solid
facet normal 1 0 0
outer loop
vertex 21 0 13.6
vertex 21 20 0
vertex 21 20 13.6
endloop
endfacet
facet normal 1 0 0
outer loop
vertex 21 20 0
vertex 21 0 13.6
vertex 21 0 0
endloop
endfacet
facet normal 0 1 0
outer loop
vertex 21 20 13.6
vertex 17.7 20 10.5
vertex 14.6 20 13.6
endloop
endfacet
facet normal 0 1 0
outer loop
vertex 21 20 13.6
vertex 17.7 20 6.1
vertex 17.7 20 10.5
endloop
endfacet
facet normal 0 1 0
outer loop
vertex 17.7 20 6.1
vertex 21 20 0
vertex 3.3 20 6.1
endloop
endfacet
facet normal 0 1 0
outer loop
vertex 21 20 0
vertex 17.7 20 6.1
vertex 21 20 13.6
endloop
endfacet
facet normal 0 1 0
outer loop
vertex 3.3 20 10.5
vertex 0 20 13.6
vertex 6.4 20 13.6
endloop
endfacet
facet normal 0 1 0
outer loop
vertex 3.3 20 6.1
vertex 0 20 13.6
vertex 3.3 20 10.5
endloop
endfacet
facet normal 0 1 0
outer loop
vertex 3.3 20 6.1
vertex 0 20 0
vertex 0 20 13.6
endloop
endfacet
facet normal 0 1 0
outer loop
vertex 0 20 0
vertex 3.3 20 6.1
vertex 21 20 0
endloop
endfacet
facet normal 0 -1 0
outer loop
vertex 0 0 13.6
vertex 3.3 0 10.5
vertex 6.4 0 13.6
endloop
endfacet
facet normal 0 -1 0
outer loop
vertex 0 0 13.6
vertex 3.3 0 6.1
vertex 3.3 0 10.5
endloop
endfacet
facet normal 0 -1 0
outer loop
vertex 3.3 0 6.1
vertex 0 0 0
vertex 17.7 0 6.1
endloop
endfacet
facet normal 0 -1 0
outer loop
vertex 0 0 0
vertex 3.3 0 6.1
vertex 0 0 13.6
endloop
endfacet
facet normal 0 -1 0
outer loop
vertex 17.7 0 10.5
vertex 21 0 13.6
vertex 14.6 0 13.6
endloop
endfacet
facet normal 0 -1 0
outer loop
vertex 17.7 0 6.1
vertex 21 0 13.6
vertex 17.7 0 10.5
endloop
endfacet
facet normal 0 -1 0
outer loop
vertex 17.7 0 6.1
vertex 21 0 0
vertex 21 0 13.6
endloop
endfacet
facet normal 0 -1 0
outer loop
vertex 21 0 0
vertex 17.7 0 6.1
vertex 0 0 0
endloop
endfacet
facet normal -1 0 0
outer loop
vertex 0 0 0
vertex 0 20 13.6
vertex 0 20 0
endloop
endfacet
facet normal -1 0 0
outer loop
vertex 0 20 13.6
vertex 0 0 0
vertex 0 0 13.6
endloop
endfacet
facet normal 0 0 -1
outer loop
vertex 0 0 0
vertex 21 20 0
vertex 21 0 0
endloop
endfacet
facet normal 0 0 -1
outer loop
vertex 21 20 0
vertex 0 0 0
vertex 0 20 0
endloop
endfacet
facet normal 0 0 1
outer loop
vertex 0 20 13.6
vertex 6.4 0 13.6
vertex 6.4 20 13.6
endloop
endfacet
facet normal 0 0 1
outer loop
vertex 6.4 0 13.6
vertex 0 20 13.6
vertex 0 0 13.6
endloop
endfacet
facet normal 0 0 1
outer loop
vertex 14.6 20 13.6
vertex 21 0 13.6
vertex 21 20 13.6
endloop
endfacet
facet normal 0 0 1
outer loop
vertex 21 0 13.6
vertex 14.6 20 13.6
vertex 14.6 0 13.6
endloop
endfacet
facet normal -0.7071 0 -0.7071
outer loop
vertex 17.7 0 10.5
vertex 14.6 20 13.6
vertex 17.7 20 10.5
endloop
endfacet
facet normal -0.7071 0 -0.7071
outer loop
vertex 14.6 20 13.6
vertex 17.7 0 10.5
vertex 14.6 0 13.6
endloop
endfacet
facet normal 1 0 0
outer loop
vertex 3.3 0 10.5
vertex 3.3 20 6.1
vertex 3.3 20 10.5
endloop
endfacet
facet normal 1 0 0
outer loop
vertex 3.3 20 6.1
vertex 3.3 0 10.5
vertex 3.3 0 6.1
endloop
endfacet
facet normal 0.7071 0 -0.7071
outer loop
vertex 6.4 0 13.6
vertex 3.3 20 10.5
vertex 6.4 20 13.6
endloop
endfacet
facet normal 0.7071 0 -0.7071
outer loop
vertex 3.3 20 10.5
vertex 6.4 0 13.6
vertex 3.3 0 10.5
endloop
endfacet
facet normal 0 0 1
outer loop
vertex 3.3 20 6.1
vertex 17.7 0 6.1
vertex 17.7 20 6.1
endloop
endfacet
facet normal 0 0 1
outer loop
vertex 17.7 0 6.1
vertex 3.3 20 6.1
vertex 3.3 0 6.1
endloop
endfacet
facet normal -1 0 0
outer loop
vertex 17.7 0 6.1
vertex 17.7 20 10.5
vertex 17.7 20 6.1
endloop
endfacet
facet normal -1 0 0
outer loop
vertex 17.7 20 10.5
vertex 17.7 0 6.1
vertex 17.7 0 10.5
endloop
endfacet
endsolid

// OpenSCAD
// Replacement C-channel FIT TEST ONLY. Existing V9 supports/top unchanged.
// clearance is per axis-aligned face; diagonal normal gap = sqrt(2)*clearance.
clearance=0.20;
assert(clearance>=.1 && clearance<=.3);
module box(a,b){translate(a)cube(b-a);}
module channel(){difference(){
 box([-10.5,.7,0],[10.5,14.3,20]);
 translate([0,0,-.1])linear_extrude(20.2)polygon([
 [-7-clearance,8+clearance],[7+clearance,8+clearance],
 [7+clearance,4-clearance],[3.5+clearance,.5-clearance],
 [-3.5-clearance,.5-clearance],[-7-clearance,4-clearance]]);
 box([-3.5-clearance,.6,-.1],[3.5+clearance,4-clearance+.1,20.1]);
}}
// SAME orientation as full brace: flat back on bed, channel facing upward.
multmatrix([[1,0,0,10.5],[0,0,1,0],[0,-1,0,14.3],[0,0,0,1]])channel();
